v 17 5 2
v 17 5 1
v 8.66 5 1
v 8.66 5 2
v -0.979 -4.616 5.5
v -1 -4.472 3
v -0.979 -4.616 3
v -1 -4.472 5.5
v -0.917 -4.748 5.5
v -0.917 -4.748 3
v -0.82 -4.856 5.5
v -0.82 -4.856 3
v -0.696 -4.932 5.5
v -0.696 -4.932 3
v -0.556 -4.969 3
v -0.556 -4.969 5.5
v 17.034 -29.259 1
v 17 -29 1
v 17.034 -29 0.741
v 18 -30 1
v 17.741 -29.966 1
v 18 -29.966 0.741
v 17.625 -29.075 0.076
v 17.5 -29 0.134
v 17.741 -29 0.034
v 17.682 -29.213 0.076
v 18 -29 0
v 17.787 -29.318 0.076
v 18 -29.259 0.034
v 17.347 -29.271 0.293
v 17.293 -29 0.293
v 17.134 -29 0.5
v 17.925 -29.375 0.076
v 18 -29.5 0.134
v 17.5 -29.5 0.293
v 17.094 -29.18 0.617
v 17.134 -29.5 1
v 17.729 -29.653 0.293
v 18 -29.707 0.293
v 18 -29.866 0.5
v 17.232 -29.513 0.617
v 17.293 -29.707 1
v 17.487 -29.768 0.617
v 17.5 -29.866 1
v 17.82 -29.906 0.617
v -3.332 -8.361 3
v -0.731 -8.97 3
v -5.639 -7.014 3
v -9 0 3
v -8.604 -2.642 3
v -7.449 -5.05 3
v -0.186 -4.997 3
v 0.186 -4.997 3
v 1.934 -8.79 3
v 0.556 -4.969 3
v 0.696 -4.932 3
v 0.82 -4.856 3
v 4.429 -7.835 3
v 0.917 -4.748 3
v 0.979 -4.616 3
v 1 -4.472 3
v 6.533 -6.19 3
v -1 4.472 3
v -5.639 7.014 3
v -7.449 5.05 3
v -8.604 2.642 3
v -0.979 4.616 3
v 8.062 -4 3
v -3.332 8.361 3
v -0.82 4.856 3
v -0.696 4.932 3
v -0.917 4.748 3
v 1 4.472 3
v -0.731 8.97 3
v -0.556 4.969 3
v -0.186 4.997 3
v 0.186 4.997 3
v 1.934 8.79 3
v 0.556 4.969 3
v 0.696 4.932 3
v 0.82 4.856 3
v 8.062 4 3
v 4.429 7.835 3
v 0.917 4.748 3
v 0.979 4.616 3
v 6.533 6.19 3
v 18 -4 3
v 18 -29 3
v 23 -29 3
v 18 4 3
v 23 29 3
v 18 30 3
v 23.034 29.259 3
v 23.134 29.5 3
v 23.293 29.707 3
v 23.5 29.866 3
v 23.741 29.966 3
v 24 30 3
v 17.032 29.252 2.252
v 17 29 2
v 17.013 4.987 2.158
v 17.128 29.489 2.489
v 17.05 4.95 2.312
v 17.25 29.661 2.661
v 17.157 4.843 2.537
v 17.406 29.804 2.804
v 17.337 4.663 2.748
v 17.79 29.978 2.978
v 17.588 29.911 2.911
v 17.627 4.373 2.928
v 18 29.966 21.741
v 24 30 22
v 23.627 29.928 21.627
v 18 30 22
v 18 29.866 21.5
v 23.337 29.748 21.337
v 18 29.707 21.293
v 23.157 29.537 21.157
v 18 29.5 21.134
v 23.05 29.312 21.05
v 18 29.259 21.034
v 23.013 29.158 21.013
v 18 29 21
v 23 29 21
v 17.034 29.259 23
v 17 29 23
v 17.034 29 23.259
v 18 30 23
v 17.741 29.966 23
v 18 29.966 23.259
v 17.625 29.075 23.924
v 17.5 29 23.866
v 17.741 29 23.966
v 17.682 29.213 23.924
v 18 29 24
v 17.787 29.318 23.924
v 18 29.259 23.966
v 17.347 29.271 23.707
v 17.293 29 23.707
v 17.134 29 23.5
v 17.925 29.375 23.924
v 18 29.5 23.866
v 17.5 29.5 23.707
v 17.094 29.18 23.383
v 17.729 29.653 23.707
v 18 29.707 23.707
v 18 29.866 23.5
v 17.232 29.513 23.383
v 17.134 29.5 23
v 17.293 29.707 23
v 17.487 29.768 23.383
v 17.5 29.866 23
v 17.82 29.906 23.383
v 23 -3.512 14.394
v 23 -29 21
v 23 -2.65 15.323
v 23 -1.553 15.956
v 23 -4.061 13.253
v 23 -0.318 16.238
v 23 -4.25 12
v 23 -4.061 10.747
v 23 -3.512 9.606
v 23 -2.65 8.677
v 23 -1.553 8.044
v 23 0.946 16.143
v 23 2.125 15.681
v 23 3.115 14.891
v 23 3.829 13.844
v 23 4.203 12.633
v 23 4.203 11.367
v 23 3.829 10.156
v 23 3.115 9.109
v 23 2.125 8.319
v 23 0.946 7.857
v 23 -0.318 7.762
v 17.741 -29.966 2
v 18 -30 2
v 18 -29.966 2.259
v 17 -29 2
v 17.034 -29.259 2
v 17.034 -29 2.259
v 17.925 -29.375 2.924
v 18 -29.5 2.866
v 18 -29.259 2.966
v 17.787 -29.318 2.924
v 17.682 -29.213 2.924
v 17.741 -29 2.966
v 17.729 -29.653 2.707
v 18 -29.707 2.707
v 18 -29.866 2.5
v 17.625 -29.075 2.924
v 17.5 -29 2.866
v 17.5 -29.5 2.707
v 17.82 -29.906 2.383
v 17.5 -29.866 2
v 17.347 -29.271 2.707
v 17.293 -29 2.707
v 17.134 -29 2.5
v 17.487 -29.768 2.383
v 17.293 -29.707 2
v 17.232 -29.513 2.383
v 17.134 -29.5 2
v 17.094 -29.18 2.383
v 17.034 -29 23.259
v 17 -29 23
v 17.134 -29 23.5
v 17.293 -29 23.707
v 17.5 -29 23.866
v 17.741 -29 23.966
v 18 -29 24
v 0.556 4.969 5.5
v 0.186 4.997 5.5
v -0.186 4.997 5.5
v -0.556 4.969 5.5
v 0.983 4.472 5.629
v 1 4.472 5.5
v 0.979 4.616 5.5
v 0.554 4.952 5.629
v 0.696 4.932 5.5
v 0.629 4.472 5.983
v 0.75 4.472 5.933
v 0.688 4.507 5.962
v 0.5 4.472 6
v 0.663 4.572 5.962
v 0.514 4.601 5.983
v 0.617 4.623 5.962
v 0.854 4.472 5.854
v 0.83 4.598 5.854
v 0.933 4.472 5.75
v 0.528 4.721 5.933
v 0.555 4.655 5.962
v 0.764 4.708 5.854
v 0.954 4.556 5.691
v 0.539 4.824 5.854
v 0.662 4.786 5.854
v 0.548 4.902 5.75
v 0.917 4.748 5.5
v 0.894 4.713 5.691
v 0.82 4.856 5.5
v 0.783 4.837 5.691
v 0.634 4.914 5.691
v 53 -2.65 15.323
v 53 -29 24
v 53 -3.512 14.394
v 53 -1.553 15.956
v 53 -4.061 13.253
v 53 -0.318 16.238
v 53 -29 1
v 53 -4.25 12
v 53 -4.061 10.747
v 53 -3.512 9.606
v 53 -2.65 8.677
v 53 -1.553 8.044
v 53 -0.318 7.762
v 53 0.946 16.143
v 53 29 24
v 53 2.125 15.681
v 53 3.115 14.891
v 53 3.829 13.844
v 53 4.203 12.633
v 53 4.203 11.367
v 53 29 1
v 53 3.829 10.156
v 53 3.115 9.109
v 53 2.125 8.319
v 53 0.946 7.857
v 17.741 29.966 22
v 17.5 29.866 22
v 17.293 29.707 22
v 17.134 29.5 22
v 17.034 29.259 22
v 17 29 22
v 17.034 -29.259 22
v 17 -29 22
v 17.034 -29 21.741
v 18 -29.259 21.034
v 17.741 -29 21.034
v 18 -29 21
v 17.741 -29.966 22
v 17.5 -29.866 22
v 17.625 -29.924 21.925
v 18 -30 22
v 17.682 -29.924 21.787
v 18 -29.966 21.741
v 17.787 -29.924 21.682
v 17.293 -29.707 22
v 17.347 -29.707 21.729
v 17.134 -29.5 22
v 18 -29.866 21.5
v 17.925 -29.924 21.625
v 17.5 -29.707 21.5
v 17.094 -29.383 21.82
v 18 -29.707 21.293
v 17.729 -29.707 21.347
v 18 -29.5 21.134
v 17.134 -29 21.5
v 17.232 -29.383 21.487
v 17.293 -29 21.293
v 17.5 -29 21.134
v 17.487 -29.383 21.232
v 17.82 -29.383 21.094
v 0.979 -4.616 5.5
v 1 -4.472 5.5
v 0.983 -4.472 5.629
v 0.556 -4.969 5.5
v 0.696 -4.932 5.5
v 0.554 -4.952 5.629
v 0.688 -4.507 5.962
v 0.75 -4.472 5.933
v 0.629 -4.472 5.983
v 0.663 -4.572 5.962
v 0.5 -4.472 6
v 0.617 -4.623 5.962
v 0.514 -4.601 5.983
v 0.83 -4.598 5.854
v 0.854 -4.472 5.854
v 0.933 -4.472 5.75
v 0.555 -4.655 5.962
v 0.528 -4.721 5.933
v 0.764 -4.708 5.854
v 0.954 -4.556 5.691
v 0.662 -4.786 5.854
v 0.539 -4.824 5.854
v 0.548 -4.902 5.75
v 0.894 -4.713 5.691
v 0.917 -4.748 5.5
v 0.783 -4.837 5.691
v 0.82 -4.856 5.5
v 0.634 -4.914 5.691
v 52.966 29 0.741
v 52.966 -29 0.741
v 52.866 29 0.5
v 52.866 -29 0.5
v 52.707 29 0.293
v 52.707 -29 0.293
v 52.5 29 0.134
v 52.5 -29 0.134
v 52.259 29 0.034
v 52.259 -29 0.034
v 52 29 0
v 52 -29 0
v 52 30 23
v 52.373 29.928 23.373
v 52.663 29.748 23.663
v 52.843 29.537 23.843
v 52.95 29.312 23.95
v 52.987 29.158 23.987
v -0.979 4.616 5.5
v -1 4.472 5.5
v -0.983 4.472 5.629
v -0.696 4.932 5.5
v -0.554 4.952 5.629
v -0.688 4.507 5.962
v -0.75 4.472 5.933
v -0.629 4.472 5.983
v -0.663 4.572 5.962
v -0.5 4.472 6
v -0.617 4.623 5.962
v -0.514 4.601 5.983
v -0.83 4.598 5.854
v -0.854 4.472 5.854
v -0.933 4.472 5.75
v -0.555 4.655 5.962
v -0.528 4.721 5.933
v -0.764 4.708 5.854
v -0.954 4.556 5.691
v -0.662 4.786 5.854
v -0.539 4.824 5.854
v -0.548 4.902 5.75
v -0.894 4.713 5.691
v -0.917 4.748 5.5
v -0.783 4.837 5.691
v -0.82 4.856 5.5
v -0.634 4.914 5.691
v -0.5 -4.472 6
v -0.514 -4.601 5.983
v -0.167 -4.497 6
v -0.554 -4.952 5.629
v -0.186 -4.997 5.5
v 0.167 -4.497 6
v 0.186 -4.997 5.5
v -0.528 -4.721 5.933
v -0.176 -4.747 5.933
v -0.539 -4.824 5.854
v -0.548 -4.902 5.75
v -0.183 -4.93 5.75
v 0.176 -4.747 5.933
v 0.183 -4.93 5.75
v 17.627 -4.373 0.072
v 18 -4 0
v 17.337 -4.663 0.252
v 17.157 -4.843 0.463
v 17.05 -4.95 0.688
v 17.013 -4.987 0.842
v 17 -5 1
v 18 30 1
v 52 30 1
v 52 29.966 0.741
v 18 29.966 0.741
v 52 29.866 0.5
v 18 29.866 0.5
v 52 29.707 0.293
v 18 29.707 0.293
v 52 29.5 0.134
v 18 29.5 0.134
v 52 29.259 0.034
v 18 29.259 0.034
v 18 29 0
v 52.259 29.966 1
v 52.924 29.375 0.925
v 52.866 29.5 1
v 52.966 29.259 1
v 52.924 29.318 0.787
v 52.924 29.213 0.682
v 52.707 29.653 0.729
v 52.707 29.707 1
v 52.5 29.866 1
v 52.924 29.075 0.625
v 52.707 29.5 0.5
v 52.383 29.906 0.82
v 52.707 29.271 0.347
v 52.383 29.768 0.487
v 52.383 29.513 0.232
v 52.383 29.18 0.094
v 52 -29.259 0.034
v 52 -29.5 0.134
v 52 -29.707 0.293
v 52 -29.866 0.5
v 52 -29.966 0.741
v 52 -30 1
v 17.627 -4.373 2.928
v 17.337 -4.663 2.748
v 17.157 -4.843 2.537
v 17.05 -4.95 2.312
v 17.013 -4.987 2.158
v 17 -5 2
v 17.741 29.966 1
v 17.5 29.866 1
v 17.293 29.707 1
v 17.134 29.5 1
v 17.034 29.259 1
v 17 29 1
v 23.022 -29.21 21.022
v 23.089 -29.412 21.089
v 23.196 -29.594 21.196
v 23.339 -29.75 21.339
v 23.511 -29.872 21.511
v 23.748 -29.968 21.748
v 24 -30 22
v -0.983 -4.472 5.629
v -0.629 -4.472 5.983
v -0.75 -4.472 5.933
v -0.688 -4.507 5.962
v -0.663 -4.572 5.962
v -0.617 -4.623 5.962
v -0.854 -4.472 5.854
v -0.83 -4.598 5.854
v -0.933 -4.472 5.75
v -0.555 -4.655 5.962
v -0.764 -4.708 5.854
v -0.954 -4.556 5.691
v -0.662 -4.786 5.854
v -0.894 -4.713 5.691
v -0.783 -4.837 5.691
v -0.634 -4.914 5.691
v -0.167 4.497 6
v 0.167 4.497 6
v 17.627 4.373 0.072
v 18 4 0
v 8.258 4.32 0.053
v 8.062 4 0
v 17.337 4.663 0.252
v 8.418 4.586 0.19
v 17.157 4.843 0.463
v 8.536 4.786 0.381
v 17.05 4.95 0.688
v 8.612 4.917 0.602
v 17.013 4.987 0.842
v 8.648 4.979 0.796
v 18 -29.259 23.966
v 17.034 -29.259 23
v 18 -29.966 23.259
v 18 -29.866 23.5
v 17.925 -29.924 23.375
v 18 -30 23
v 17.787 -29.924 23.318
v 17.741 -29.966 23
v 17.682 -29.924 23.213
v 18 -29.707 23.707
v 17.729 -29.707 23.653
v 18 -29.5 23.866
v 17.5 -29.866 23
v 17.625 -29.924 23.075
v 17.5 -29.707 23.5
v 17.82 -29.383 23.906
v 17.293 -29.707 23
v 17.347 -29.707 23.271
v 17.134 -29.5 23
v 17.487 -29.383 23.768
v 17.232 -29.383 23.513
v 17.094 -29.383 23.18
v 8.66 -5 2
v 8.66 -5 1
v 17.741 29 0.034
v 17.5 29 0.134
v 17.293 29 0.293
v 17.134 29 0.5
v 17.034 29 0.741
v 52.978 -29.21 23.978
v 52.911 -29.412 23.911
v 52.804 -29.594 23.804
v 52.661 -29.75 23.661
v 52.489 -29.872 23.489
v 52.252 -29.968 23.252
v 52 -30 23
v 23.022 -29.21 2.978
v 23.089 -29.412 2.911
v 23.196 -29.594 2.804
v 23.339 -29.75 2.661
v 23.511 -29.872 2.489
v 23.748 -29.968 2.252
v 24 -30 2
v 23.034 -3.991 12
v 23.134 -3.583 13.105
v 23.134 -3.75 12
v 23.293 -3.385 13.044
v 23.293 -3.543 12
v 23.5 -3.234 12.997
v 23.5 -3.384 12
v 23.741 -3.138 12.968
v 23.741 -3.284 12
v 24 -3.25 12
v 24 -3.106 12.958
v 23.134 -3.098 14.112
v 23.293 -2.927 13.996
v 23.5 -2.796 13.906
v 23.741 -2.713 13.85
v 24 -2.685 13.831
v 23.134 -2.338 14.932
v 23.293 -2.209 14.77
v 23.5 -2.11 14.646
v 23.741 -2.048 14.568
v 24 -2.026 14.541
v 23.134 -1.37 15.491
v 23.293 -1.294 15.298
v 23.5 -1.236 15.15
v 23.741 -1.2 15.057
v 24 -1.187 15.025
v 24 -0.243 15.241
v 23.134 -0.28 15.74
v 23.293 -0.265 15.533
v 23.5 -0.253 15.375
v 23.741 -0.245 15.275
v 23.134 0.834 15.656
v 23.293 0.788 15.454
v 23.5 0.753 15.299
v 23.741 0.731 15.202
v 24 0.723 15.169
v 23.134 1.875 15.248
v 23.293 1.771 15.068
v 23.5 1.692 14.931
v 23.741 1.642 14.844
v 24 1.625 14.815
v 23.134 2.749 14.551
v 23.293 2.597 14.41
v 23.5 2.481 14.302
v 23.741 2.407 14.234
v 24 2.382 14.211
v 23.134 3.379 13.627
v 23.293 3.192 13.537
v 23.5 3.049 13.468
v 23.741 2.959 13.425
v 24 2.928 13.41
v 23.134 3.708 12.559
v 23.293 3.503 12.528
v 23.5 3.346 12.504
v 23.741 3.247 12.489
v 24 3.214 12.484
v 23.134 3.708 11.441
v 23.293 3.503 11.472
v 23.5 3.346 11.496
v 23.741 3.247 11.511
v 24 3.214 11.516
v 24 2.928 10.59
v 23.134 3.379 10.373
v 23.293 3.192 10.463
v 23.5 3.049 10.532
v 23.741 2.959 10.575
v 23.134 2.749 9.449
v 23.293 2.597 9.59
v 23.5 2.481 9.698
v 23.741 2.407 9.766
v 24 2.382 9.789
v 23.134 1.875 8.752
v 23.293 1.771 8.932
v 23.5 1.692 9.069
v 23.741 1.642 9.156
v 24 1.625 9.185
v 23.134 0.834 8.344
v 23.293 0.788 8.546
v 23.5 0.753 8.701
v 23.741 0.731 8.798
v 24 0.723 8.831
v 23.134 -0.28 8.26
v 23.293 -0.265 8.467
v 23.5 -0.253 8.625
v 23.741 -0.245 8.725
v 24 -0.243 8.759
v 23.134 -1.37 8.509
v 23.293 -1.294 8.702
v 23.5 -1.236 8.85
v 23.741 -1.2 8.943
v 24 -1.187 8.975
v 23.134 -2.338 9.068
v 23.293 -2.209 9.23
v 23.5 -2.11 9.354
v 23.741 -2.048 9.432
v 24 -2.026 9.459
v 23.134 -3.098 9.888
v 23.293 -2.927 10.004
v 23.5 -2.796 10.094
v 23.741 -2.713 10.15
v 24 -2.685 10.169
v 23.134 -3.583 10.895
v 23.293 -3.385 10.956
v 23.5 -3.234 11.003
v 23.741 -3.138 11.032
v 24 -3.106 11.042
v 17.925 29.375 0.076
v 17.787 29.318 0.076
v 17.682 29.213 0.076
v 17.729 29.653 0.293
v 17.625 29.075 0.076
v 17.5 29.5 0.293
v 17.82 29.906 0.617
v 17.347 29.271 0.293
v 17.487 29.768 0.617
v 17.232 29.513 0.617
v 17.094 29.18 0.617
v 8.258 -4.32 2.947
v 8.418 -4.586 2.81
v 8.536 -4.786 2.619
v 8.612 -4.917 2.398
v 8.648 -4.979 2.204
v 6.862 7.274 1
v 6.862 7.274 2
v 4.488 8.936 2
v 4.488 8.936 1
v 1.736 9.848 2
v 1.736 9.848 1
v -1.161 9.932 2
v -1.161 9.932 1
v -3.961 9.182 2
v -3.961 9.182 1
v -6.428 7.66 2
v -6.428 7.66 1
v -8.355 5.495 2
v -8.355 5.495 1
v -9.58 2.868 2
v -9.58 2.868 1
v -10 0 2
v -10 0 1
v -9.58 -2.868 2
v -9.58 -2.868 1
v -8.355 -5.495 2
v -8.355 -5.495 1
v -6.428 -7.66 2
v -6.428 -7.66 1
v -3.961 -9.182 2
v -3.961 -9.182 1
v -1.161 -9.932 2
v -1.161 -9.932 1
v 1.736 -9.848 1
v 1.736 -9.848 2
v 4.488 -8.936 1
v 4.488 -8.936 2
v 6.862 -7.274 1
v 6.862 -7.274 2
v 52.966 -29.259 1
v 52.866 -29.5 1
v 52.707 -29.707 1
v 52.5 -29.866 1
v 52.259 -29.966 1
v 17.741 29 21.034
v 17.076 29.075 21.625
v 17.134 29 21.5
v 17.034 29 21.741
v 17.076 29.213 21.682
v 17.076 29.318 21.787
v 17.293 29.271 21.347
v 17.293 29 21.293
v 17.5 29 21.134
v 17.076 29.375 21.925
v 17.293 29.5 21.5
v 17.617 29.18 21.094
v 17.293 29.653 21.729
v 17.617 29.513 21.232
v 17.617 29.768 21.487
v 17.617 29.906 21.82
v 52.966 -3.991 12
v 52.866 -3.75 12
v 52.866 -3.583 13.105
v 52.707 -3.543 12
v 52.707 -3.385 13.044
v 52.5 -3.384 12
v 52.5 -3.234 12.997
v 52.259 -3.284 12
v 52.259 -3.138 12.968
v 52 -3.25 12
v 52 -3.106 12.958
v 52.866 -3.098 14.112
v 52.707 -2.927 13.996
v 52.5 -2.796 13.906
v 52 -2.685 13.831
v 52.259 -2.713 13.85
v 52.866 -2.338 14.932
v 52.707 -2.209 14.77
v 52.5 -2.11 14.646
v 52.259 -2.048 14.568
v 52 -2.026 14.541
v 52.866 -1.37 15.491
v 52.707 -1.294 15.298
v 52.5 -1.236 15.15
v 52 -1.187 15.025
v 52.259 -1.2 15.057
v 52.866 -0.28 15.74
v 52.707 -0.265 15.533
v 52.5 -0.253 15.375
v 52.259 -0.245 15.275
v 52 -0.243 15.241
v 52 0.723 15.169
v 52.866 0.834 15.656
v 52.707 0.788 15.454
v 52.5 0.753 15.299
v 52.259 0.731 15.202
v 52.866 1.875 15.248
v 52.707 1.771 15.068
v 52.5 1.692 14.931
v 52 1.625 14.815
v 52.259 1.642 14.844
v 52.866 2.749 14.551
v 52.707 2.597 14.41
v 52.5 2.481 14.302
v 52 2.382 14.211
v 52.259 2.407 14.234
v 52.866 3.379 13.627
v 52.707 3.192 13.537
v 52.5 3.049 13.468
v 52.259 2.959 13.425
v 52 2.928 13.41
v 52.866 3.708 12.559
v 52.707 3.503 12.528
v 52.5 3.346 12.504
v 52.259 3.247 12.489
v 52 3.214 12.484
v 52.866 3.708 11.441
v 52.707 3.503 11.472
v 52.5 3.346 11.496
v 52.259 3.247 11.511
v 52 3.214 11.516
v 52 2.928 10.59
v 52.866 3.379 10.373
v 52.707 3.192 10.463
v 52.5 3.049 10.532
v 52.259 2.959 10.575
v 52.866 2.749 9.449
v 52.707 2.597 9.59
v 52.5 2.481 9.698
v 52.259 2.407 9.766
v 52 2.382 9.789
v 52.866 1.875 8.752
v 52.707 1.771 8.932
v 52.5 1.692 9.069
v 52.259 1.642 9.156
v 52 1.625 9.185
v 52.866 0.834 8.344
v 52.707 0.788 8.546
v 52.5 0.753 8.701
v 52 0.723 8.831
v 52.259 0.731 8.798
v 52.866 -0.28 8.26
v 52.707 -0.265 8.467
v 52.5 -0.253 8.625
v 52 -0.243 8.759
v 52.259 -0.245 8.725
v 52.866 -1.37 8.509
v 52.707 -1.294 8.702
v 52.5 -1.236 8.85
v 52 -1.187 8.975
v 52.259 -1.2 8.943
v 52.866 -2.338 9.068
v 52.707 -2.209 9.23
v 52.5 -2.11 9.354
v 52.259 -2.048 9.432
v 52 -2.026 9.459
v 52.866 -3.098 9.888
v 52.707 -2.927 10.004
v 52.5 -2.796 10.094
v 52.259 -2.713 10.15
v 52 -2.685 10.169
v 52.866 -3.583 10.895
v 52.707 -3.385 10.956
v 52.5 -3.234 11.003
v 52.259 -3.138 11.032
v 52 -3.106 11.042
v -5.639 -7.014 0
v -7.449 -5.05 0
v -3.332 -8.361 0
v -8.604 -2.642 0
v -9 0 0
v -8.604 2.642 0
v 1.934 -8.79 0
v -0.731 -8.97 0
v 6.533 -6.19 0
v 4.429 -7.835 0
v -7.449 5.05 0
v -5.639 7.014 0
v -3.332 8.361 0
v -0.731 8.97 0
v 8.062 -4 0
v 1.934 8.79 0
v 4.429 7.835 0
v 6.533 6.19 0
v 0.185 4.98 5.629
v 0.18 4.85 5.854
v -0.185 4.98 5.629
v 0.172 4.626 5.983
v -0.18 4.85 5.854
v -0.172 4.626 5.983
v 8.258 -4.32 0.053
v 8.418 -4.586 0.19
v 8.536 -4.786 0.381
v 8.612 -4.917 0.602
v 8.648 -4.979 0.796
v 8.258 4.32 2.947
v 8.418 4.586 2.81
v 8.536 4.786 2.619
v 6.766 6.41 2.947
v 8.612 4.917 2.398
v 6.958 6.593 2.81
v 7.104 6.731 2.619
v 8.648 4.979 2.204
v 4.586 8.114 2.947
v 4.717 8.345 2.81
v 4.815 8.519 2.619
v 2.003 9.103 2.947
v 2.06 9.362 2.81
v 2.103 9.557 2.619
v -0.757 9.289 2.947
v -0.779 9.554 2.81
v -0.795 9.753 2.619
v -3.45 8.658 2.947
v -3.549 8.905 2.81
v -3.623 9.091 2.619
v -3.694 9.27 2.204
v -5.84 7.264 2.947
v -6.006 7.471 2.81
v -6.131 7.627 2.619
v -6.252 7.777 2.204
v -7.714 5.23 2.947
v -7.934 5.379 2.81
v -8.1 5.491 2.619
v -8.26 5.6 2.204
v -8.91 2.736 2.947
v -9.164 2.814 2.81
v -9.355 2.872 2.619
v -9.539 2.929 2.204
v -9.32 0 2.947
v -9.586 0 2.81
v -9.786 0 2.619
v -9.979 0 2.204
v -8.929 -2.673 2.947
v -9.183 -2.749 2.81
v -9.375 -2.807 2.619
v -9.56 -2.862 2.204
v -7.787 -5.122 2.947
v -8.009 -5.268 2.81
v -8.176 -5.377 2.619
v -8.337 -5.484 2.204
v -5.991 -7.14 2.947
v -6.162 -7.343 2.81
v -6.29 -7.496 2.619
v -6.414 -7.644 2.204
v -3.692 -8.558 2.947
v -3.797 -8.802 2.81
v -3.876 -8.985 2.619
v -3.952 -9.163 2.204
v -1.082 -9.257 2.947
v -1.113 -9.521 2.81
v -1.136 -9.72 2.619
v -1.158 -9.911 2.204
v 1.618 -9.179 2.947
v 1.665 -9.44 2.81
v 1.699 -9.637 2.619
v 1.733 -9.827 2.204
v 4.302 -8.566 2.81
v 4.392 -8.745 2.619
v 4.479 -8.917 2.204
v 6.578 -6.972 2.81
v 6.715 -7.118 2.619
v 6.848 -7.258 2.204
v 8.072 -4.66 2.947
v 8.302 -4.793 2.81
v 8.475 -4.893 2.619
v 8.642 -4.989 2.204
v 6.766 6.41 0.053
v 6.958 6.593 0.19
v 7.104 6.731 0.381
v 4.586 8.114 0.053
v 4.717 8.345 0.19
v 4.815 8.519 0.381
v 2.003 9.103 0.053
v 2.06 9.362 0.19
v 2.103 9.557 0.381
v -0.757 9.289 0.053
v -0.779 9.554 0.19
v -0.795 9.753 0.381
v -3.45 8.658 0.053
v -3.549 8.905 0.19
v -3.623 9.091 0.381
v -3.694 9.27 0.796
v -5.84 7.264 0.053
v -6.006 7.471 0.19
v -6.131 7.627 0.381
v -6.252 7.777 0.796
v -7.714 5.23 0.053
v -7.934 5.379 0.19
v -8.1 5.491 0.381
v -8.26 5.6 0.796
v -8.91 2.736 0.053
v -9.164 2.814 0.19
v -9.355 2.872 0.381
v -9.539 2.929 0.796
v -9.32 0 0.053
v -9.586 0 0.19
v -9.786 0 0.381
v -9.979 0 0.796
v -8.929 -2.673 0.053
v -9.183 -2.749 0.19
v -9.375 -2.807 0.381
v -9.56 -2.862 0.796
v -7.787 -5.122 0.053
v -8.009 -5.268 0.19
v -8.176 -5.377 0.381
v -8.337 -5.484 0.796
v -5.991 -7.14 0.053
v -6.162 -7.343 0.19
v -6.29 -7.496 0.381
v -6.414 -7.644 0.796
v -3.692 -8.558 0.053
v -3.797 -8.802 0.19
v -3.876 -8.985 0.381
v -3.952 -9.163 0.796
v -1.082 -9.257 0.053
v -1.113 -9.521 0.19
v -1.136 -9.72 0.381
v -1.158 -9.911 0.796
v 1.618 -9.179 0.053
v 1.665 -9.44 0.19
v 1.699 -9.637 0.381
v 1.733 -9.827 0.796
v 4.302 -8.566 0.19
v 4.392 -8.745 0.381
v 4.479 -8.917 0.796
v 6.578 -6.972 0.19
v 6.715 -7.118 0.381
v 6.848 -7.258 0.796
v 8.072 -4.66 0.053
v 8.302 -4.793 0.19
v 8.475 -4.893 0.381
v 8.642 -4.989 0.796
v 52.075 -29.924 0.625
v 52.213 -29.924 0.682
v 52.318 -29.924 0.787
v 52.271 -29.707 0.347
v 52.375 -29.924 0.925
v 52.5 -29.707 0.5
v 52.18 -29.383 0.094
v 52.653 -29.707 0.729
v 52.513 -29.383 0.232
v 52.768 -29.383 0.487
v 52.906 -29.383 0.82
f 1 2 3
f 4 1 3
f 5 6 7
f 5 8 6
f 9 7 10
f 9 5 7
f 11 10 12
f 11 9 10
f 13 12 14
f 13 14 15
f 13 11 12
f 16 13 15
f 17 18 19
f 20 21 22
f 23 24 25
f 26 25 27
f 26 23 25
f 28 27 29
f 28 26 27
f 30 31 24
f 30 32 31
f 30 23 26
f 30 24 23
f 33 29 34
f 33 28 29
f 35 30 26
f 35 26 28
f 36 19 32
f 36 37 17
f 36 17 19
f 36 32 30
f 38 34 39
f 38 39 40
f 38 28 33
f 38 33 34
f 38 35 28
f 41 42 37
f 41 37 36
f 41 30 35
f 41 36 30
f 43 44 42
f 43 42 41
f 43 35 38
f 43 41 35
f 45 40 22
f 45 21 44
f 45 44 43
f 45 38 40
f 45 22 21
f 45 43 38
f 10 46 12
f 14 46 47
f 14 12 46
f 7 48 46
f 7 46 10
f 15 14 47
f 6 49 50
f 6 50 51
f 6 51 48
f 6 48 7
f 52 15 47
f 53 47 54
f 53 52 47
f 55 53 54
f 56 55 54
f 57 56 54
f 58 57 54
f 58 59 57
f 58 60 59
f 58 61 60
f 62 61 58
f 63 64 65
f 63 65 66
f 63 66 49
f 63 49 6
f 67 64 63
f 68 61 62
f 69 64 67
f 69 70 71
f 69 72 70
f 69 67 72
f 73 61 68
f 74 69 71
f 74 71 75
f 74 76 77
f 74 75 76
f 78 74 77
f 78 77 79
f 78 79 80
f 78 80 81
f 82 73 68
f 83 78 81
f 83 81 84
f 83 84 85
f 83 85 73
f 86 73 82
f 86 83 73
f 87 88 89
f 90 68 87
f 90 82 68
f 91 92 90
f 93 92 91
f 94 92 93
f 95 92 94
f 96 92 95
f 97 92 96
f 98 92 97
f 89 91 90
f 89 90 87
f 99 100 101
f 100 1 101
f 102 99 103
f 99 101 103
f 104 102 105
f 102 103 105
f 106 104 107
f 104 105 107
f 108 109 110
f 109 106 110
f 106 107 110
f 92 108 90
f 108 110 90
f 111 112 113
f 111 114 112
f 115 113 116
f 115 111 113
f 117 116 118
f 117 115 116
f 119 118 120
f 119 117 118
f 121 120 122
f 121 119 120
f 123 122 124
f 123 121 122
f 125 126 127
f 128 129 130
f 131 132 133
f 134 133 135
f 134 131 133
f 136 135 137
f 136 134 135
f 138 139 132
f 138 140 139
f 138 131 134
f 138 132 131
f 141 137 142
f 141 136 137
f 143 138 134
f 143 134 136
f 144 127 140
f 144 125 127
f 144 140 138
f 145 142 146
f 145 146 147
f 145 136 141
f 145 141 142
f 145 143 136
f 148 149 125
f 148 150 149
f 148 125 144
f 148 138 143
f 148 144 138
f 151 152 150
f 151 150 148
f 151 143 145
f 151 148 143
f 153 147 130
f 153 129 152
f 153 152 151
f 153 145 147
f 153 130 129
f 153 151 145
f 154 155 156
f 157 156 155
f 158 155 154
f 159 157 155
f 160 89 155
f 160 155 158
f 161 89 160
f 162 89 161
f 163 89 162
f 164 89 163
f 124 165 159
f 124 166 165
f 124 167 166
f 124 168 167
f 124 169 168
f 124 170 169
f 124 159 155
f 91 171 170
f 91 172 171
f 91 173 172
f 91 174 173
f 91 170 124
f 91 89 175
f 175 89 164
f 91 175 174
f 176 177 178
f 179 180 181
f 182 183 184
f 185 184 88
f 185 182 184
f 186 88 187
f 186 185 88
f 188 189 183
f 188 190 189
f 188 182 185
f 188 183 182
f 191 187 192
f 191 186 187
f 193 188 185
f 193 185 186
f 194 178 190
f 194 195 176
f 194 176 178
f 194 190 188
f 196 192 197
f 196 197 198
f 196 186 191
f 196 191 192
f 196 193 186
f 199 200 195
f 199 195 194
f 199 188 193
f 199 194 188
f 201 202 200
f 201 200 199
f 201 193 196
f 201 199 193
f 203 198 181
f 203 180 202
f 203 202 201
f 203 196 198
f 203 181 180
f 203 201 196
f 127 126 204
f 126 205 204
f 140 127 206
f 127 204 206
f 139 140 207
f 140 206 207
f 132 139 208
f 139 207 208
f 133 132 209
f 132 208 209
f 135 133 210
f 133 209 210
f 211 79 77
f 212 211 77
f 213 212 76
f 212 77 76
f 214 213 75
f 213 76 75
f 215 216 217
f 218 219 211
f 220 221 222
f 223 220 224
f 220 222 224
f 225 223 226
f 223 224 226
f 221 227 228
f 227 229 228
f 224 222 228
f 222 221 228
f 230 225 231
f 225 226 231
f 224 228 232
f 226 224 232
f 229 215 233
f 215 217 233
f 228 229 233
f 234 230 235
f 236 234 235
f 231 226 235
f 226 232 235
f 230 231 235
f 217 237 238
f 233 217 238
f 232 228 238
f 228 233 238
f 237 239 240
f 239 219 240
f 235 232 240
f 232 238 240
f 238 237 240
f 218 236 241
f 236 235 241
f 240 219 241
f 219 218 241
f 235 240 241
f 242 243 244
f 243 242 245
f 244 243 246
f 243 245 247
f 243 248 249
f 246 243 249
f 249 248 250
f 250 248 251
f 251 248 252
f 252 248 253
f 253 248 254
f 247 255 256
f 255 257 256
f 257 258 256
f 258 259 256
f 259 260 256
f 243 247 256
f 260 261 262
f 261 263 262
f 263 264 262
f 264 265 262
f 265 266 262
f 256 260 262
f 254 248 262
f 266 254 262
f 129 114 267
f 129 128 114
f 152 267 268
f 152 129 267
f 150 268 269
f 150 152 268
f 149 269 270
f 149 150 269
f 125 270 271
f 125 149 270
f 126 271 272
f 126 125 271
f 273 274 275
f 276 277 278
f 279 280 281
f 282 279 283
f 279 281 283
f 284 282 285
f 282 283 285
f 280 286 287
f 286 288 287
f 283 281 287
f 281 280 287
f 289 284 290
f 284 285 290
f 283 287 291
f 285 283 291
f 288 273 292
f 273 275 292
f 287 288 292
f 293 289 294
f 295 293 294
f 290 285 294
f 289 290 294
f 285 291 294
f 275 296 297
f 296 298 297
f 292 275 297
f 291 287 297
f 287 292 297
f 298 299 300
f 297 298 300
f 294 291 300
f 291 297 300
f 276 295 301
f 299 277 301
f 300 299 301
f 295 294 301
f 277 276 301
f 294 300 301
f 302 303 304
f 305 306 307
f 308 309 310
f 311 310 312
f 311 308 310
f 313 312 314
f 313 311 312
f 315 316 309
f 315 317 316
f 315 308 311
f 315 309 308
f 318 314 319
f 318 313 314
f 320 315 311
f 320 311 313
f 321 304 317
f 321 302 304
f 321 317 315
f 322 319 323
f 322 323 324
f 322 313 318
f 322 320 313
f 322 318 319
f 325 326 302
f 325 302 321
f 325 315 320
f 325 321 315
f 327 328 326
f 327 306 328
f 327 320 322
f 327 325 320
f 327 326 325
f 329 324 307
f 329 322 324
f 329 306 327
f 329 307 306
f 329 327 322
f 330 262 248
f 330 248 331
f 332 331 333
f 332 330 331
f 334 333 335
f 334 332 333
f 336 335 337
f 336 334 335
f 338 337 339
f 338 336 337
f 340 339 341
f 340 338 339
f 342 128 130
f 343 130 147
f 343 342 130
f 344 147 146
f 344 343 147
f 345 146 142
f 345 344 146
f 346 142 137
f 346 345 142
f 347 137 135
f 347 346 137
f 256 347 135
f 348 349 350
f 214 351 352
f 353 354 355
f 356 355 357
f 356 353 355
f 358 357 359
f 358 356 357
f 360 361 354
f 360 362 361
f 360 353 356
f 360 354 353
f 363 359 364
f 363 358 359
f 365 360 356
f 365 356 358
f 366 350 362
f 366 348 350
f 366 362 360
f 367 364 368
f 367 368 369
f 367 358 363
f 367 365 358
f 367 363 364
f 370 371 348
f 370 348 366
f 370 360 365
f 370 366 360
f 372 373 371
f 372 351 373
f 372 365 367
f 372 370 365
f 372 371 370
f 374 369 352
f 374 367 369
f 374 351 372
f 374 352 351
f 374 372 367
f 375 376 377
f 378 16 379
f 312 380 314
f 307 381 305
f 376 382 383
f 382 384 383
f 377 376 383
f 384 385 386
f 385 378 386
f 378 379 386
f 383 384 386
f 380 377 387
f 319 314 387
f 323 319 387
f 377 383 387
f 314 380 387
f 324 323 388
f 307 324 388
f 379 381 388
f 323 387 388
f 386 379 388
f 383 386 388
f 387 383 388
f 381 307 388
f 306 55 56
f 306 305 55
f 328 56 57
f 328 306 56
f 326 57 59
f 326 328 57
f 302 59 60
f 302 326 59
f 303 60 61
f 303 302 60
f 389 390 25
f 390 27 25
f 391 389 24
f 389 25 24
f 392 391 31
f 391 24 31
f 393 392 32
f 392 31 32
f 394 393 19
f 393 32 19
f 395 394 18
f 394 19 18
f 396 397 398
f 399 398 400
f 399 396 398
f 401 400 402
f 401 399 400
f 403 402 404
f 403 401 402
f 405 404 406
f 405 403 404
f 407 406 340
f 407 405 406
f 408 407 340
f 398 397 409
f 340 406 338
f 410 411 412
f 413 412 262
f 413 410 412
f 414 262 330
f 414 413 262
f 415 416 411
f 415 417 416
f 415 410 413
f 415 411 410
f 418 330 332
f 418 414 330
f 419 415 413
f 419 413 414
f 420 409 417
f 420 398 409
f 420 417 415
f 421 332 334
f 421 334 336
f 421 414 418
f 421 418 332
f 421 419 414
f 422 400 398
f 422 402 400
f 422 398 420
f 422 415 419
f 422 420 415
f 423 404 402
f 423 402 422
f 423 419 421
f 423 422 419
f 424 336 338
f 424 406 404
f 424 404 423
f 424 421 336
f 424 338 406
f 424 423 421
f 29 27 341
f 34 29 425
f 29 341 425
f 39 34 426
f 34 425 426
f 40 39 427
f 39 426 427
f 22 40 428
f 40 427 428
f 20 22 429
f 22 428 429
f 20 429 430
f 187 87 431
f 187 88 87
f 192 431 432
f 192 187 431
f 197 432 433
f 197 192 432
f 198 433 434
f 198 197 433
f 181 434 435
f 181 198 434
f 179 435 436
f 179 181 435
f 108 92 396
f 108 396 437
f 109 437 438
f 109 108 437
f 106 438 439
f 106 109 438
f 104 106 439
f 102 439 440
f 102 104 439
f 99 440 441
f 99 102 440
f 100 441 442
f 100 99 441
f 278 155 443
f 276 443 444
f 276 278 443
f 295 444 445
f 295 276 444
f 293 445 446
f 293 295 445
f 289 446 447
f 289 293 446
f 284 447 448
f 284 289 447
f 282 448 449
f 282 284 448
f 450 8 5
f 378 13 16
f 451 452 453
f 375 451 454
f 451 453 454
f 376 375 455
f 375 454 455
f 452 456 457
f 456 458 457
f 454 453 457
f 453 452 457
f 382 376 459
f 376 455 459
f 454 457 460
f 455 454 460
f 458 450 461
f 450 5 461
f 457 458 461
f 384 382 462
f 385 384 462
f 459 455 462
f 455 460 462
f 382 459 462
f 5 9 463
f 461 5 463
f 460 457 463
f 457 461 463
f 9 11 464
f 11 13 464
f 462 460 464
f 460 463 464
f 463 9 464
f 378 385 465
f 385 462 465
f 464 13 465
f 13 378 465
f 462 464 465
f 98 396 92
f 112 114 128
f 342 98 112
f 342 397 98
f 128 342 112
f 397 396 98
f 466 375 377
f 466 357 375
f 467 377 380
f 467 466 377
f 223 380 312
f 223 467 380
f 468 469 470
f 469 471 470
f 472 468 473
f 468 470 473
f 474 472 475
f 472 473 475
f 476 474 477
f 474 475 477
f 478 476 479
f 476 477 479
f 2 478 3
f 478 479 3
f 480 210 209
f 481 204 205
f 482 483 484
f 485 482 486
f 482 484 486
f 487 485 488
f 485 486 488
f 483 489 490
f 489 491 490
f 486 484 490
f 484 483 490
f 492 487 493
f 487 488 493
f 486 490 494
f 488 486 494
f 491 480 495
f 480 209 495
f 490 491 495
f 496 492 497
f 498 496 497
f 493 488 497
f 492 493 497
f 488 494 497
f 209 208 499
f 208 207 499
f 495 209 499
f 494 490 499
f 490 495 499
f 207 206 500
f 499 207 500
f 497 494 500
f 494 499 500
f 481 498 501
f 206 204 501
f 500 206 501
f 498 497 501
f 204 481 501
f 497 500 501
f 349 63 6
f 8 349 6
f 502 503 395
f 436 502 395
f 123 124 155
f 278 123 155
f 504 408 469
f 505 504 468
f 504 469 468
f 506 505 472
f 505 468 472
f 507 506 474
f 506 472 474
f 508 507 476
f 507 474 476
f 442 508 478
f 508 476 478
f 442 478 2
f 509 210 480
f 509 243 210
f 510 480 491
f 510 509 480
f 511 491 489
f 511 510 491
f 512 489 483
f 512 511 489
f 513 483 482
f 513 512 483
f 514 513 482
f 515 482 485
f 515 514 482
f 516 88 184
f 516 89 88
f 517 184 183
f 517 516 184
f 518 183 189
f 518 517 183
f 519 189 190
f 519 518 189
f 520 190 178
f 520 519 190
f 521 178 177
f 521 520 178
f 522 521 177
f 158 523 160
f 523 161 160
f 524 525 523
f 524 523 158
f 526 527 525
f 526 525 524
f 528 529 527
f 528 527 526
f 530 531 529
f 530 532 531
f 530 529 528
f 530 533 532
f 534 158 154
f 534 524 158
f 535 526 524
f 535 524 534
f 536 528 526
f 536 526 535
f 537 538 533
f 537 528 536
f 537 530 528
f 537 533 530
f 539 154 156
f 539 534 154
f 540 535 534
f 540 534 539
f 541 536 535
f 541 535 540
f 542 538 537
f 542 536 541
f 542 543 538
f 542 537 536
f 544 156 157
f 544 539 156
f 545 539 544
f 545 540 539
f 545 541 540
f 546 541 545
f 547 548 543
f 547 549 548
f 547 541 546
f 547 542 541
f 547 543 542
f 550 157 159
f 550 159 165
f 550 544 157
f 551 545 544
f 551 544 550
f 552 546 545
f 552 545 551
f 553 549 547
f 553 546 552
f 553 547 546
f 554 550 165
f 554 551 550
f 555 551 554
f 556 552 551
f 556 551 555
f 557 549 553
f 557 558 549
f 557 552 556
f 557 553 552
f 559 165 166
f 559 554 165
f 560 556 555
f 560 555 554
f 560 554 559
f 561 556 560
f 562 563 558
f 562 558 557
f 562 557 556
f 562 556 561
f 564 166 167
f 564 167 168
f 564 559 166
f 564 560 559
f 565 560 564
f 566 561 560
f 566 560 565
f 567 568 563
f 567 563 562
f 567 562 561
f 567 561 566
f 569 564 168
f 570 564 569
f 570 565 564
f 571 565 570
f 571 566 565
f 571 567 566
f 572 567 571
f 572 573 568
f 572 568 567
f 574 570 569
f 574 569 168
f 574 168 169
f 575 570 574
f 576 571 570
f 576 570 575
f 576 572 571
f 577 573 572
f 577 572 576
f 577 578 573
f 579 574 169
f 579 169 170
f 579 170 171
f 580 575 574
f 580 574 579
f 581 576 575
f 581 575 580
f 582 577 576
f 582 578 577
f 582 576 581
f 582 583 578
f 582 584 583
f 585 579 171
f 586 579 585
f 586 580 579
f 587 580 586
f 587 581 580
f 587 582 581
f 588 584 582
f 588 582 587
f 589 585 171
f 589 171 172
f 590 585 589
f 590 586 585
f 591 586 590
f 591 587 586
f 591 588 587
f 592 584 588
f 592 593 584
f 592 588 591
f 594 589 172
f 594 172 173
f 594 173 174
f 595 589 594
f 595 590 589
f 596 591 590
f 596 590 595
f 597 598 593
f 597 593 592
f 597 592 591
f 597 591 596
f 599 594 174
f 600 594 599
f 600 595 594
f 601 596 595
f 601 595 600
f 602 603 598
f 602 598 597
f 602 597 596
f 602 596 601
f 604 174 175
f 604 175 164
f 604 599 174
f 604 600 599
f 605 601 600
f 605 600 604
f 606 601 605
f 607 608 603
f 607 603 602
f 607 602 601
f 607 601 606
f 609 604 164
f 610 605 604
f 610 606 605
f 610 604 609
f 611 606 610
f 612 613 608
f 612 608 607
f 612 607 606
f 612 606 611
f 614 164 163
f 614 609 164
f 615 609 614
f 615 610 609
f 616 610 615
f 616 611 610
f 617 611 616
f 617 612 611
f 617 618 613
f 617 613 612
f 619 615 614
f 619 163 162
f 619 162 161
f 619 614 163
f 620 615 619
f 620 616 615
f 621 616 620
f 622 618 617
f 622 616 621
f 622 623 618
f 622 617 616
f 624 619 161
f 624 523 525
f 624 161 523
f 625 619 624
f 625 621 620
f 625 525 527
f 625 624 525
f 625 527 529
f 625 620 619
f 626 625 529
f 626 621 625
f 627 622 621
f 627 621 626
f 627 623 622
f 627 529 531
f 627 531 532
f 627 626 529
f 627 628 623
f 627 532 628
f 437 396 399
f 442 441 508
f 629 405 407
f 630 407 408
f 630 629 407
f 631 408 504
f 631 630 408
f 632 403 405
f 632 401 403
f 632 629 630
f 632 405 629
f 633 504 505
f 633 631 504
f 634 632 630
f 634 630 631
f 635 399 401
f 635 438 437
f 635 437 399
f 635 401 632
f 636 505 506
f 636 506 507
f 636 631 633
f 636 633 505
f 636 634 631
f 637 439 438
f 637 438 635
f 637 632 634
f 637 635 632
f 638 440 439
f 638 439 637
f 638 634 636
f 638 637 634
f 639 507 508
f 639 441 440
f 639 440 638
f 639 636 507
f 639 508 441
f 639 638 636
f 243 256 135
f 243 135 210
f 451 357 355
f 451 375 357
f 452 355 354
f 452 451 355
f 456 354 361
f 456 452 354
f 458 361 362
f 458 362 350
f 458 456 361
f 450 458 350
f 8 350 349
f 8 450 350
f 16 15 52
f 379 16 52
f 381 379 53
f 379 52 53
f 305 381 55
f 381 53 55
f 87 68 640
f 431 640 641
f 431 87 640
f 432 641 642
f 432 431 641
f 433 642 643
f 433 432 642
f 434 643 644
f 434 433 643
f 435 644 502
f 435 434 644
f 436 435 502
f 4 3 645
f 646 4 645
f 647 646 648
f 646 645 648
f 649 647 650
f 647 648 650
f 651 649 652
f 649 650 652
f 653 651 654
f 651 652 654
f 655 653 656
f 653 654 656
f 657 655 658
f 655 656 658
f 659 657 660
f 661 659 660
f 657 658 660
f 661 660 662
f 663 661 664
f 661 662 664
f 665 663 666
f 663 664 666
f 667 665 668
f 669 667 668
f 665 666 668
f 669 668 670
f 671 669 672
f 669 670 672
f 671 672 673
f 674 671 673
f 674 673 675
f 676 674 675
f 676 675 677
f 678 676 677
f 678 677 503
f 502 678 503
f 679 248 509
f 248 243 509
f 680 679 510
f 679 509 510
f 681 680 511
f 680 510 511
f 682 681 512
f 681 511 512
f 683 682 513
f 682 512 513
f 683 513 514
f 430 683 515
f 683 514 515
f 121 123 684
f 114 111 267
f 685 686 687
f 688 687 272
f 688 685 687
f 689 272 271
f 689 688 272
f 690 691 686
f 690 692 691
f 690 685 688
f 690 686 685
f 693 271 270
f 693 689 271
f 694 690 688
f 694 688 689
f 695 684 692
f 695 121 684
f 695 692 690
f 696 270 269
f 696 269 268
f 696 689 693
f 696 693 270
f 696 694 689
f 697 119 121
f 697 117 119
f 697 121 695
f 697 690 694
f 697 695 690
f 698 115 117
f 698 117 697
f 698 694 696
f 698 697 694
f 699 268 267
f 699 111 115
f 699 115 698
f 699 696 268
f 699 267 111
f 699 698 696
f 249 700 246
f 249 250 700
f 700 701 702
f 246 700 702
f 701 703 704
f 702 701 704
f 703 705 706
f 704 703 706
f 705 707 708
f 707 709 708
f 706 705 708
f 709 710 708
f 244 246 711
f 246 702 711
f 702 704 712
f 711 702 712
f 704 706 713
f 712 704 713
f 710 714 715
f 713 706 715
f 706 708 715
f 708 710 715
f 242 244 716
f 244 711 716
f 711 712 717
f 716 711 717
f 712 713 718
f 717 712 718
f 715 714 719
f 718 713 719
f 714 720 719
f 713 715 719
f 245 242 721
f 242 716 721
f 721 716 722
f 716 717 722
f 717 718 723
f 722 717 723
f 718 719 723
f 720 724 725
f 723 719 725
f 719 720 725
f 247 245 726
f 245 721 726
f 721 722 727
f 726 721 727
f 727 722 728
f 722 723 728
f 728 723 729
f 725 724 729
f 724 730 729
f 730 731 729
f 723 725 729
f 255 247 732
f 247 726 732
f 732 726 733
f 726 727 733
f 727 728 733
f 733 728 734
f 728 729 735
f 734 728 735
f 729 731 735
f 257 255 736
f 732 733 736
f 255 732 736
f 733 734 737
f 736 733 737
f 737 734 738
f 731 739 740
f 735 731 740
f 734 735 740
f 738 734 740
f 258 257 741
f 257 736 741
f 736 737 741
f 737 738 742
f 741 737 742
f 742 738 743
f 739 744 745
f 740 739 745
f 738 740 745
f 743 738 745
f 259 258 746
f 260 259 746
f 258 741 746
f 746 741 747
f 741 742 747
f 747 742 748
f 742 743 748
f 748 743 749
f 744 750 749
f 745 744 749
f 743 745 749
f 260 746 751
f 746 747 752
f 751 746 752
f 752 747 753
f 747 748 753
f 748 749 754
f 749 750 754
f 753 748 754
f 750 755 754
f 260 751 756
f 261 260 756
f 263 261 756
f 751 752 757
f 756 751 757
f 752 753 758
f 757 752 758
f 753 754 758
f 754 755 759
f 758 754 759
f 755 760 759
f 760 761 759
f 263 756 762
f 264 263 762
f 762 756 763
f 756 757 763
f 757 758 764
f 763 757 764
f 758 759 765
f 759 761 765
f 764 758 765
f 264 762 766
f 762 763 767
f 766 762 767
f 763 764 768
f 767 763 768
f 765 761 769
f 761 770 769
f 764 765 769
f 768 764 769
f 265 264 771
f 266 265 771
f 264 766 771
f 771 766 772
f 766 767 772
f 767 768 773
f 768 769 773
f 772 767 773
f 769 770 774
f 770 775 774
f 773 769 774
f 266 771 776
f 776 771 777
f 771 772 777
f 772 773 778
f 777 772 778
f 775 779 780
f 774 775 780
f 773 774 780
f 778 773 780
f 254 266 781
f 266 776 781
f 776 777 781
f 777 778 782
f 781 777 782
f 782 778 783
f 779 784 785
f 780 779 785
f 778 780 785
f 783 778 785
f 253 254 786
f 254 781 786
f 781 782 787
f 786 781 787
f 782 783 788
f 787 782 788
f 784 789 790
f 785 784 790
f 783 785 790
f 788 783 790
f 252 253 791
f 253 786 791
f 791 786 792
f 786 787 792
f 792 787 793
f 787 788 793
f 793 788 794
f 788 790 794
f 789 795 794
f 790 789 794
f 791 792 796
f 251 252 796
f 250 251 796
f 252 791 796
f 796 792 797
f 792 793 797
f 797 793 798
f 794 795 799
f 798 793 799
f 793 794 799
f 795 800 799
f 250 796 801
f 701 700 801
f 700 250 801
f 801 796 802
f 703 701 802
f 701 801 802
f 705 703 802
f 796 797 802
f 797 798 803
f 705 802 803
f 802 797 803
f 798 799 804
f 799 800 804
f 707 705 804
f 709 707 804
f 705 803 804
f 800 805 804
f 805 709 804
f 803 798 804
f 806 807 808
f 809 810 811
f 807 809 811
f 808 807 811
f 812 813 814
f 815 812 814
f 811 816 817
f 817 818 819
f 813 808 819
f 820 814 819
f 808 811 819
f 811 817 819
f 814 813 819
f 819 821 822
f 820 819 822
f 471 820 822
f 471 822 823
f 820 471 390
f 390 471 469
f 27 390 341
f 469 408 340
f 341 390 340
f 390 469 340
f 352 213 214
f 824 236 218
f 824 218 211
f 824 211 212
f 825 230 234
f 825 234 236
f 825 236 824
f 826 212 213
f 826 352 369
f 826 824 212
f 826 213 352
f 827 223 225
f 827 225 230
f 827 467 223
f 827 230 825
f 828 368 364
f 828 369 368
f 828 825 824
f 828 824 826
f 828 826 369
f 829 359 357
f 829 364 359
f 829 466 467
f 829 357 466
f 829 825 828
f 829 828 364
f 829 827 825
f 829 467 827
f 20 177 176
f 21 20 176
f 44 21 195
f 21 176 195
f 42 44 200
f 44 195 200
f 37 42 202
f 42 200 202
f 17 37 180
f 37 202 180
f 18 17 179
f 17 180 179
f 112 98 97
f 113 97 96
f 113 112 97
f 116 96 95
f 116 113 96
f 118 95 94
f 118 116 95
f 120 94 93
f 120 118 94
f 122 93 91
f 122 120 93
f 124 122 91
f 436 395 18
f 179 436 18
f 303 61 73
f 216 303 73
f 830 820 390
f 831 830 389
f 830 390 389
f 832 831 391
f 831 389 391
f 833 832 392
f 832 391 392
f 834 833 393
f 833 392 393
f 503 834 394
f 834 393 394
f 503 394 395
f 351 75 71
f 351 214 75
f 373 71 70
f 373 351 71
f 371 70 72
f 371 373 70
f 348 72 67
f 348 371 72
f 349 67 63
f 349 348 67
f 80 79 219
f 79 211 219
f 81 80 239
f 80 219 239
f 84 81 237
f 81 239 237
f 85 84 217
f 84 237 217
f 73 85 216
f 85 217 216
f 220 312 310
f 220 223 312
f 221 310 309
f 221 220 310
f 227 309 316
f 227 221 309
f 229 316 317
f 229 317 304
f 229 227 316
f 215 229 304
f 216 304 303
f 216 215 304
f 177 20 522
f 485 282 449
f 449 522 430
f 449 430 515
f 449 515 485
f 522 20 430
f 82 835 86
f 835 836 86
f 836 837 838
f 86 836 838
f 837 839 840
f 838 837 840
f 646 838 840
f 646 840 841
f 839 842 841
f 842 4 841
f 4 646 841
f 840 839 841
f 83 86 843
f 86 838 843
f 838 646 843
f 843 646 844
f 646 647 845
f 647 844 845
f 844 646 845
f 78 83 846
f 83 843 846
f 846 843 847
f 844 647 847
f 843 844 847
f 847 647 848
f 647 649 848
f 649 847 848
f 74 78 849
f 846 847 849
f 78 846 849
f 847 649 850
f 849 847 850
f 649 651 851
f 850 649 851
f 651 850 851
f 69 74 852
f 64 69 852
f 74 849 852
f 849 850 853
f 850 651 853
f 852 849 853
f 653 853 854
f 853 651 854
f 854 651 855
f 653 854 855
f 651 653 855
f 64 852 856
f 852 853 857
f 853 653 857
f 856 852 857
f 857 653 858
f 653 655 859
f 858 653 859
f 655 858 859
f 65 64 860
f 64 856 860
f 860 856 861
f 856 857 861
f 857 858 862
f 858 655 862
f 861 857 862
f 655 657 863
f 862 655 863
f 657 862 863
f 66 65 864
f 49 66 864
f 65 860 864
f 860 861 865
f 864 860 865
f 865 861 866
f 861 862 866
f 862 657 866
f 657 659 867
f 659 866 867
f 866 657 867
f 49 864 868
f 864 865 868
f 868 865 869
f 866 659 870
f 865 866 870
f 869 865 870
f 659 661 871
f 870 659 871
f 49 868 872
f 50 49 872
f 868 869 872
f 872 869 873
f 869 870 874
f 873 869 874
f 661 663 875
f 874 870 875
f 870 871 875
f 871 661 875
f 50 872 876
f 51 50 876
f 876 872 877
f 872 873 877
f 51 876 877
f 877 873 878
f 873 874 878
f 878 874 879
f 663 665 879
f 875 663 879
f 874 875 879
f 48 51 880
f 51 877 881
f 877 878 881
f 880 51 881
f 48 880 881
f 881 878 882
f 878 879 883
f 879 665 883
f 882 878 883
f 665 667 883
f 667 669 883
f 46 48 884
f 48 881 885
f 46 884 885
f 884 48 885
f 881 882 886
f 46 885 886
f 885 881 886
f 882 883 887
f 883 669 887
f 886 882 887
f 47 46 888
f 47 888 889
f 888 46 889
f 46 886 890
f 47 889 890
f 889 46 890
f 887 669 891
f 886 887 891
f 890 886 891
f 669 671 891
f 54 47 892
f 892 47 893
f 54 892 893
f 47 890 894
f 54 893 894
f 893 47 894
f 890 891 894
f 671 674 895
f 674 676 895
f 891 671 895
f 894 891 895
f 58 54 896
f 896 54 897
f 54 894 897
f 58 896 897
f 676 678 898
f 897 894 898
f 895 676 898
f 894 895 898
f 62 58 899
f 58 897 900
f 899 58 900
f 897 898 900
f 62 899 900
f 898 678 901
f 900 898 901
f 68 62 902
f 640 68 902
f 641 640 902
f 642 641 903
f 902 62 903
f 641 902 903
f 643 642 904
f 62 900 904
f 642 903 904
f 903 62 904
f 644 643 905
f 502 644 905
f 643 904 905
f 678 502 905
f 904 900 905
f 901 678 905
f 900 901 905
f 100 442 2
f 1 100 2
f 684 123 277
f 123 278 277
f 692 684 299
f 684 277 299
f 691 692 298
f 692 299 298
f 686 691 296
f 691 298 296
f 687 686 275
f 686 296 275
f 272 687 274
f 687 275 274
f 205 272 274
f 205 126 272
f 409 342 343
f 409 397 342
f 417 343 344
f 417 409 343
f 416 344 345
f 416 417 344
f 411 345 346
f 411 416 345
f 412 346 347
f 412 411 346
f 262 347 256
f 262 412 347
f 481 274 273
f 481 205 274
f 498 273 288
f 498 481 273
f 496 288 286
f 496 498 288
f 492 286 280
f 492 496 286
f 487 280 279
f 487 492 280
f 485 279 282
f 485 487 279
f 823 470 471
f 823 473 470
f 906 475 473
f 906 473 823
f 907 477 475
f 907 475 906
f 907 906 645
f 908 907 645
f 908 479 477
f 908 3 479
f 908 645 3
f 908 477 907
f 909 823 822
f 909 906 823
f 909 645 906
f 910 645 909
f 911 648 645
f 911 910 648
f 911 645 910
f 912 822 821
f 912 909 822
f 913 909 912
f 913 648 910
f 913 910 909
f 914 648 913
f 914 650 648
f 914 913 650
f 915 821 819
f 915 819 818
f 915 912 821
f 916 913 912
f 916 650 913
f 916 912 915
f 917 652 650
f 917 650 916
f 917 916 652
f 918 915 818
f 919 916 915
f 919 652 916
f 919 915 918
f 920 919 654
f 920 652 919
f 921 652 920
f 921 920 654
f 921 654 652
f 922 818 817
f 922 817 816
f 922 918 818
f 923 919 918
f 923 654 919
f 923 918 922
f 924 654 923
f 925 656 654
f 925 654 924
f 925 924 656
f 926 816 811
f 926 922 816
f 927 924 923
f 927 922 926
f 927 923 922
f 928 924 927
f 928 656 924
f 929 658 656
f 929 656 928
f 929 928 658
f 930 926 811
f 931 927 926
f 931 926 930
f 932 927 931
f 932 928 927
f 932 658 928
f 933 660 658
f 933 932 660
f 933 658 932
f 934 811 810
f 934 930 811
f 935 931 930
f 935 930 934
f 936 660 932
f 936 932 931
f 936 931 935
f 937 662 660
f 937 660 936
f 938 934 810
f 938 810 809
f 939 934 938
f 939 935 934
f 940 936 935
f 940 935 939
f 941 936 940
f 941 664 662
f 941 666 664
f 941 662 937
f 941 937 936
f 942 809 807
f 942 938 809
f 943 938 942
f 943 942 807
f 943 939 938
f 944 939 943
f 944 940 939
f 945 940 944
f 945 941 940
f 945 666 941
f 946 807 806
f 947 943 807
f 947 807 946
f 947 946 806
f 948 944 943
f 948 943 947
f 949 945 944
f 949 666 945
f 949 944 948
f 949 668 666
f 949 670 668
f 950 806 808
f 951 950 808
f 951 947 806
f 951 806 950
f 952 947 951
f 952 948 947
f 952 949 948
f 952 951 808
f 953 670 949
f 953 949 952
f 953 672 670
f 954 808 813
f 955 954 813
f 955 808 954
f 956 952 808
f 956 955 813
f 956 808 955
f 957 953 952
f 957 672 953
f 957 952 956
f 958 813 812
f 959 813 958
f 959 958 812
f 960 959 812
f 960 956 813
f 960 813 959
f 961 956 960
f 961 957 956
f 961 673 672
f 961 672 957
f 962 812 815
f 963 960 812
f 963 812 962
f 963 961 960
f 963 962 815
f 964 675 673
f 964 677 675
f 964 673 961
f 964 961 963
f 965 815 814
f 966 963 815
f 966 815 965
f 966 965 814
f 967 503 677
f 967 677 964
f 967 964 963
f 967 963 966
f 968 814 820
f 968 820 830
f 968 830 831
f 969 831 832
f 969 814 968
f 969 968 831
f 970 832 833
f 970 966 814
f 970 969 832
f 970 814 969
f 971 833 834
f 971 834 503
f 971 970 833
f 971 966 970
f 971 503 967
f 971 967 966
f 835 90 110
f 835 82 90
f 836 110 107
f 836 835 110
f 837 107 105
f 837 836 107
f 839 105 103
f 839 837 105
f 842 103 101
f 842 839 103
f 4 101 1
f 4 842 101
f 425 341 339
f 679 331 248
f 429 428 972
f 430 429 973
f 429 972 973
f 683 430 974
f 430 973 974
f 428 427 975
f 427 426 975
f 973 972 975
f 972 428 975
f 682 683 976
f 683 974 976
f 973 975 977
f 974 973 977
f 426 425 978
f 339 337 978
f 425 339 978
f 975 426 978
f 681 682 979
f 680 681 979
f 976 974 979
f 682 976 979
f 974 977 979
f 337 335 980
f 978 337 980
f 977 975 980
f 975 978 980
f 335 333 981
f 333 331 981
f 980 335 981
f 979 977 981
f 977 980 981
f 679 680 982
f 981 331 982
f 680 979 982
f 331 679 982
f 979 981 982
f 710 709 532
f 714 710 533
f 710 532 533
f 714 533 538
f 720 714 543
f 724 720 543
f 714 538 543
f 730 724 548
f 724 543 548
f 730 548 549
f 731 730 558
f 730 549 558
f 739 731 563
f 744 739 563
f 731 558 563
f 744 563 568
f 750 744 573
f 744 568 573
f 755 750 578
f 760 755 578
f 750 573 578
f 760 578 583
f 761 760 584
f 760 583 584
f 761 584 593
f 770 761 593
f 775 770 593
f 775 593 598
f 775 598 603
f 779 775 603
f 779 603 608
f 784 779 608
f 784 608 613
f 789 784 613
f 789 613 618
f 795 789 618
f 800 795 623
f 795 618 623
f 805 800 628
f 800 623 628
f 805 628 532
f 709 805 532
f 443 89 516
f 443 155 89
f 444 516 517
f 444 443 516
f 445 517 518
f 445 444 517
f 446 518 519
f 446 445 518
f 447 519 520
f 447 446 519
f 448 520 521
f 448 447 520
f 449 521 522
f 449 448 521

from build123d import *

# Parameters (mm, degrees)
F0_R     = 5
F1_DEPTH = 3
F3_DEPTH = 3
F4_W     = 30
F4_H     = 60
F5_DEPTH = 21
F6_W     = 60
F6_H     = 3
F7_DEPTH = 6
F8_R     = 3.25
F9_DEPTH = 30
F10_R    = 1
F11_R    = 0.5


# Not quite as in the source:
# - a feature names something its author has since deleted; it is built from what else it names


with BuildPart() as f1:
    # F0 (on Top) → F1 (new body)
    with BuildSketch(Plane.XY):
        with BuildLine():
            Line((17, 5), (8.6602540378, 5))
            ThreePointArc((8.6602540378, 5), (-10, 0), (8.6602540378, -5))
            Line((8.6602540378, -5), (17, -5))
            Line((17, -5), (17, -30))
            Line((17, -30), (53, -30))
            Line((53, -30), (53, 30))
            Line((53, 30), (17, 30))
            Line((17, 30), (17, 5))
        make_face()
        Circle(F0_R, mode=Mode.SUBTRACT)
        Circle(F0_R)
    extrude(amount=F1_DEPTH)

    # F2 (on face) → F3 (join)
    with BuildSketch(Plane.XY.offset(3)):
        with BuildLine():
            Line((1, -4.8989794856), (1, 4.8989794856))
            ThreePointArc((1, 4.8989794856), (0, 5), (-1, 4.8989794856))
            Line((-1, 4.8989794856), (-1, -4.8989794856))
            ThreePointArc((-1, -4.8989794856), (0, -5), (1, -4.8989794856))
        make_face()
    extrude(amount=F3_DEPTH)

    # F4 (on face) → F5 (join)
    with BuildSketch(Plane.XY.offset(3)):
        with Locations((38, 0)):
            Rectangle(F4_W, F4_H)
    extrude(amount=F5_DEPTH)

    # F6 (on face) → F7 (join)
    with BuildSketch(Plane(origin=(23, 0, 0), x_dir=(0, -1, 0), z_dir=(-1, 0, 0))):
        with Locations((0, 22.5)):
            Rectangle(F6_W, F6_H)
    extrude(amount=F7_DEPTH)

    # F8 (on face) → F9 (cut)
    with BuildSketch(Plane(origin=(23, 0, 0), x_dir=(0, -1, 0), z_dir=(-1, 0, 0))):
        with Locations((0, 12)):
            Circle(F8_R)
    extrude(amount=-F9_DEPTH, mode=Mode.SUBTRACT)

    # F10
    f10_edges = [f1.edges().sort_by_distance(p)[0] for p in [
        (17, -30, 1.5),
        (17, 30, 1.5),
        (23, 3.25, 12),
        (12.830127, -5, 3),
        (-10, 0, 3),
        (12.830127, 5, 3),
        (35, 30, 0),
        (53, 30, 12),
        (17, 17.5, 0),
        (12.830127, 5, 0),
        (-10, 0, 0),
        (12.830127, -5, 0),
        (17, -17.5, 0),
        (53, 0, 0),
        (35, -30, 0),
        (53, -30, 12),
        (53, 3.25, 12),
        (23, -30, 12),
        (23, 30, 12),
        (20, 30, 21),
        (17, 0, 21),
        (17, 30, 22.5),
        (17, 0, 24),
        (35, 30, 24),
        (35, -30, 24),
        (17, -30, 22.5),
        (20, -30, 21),
        (20, -30, 3),
        (17, -17.5, 3),
        (17, 17.5, 3),
    ]]
    fillet(f10_edges, radius=F10_R)

    # F11
    f11_edges = [f1.edges().sort_by_distance(p)[0] for p in [
        (0, -5, 6),
        (0, 5, 6),
        (-1, -4.898979, 4.5),
        (1, -4.898979, 4.5),
        (1, 4.898979, 4.5),
        (-1, 4.898979, 4.5),
        (-1, 0, 6),
        (1, 0, 6),
    ]]
    fillet(f11_edges, radius=F11_R)


solid = f1.part
